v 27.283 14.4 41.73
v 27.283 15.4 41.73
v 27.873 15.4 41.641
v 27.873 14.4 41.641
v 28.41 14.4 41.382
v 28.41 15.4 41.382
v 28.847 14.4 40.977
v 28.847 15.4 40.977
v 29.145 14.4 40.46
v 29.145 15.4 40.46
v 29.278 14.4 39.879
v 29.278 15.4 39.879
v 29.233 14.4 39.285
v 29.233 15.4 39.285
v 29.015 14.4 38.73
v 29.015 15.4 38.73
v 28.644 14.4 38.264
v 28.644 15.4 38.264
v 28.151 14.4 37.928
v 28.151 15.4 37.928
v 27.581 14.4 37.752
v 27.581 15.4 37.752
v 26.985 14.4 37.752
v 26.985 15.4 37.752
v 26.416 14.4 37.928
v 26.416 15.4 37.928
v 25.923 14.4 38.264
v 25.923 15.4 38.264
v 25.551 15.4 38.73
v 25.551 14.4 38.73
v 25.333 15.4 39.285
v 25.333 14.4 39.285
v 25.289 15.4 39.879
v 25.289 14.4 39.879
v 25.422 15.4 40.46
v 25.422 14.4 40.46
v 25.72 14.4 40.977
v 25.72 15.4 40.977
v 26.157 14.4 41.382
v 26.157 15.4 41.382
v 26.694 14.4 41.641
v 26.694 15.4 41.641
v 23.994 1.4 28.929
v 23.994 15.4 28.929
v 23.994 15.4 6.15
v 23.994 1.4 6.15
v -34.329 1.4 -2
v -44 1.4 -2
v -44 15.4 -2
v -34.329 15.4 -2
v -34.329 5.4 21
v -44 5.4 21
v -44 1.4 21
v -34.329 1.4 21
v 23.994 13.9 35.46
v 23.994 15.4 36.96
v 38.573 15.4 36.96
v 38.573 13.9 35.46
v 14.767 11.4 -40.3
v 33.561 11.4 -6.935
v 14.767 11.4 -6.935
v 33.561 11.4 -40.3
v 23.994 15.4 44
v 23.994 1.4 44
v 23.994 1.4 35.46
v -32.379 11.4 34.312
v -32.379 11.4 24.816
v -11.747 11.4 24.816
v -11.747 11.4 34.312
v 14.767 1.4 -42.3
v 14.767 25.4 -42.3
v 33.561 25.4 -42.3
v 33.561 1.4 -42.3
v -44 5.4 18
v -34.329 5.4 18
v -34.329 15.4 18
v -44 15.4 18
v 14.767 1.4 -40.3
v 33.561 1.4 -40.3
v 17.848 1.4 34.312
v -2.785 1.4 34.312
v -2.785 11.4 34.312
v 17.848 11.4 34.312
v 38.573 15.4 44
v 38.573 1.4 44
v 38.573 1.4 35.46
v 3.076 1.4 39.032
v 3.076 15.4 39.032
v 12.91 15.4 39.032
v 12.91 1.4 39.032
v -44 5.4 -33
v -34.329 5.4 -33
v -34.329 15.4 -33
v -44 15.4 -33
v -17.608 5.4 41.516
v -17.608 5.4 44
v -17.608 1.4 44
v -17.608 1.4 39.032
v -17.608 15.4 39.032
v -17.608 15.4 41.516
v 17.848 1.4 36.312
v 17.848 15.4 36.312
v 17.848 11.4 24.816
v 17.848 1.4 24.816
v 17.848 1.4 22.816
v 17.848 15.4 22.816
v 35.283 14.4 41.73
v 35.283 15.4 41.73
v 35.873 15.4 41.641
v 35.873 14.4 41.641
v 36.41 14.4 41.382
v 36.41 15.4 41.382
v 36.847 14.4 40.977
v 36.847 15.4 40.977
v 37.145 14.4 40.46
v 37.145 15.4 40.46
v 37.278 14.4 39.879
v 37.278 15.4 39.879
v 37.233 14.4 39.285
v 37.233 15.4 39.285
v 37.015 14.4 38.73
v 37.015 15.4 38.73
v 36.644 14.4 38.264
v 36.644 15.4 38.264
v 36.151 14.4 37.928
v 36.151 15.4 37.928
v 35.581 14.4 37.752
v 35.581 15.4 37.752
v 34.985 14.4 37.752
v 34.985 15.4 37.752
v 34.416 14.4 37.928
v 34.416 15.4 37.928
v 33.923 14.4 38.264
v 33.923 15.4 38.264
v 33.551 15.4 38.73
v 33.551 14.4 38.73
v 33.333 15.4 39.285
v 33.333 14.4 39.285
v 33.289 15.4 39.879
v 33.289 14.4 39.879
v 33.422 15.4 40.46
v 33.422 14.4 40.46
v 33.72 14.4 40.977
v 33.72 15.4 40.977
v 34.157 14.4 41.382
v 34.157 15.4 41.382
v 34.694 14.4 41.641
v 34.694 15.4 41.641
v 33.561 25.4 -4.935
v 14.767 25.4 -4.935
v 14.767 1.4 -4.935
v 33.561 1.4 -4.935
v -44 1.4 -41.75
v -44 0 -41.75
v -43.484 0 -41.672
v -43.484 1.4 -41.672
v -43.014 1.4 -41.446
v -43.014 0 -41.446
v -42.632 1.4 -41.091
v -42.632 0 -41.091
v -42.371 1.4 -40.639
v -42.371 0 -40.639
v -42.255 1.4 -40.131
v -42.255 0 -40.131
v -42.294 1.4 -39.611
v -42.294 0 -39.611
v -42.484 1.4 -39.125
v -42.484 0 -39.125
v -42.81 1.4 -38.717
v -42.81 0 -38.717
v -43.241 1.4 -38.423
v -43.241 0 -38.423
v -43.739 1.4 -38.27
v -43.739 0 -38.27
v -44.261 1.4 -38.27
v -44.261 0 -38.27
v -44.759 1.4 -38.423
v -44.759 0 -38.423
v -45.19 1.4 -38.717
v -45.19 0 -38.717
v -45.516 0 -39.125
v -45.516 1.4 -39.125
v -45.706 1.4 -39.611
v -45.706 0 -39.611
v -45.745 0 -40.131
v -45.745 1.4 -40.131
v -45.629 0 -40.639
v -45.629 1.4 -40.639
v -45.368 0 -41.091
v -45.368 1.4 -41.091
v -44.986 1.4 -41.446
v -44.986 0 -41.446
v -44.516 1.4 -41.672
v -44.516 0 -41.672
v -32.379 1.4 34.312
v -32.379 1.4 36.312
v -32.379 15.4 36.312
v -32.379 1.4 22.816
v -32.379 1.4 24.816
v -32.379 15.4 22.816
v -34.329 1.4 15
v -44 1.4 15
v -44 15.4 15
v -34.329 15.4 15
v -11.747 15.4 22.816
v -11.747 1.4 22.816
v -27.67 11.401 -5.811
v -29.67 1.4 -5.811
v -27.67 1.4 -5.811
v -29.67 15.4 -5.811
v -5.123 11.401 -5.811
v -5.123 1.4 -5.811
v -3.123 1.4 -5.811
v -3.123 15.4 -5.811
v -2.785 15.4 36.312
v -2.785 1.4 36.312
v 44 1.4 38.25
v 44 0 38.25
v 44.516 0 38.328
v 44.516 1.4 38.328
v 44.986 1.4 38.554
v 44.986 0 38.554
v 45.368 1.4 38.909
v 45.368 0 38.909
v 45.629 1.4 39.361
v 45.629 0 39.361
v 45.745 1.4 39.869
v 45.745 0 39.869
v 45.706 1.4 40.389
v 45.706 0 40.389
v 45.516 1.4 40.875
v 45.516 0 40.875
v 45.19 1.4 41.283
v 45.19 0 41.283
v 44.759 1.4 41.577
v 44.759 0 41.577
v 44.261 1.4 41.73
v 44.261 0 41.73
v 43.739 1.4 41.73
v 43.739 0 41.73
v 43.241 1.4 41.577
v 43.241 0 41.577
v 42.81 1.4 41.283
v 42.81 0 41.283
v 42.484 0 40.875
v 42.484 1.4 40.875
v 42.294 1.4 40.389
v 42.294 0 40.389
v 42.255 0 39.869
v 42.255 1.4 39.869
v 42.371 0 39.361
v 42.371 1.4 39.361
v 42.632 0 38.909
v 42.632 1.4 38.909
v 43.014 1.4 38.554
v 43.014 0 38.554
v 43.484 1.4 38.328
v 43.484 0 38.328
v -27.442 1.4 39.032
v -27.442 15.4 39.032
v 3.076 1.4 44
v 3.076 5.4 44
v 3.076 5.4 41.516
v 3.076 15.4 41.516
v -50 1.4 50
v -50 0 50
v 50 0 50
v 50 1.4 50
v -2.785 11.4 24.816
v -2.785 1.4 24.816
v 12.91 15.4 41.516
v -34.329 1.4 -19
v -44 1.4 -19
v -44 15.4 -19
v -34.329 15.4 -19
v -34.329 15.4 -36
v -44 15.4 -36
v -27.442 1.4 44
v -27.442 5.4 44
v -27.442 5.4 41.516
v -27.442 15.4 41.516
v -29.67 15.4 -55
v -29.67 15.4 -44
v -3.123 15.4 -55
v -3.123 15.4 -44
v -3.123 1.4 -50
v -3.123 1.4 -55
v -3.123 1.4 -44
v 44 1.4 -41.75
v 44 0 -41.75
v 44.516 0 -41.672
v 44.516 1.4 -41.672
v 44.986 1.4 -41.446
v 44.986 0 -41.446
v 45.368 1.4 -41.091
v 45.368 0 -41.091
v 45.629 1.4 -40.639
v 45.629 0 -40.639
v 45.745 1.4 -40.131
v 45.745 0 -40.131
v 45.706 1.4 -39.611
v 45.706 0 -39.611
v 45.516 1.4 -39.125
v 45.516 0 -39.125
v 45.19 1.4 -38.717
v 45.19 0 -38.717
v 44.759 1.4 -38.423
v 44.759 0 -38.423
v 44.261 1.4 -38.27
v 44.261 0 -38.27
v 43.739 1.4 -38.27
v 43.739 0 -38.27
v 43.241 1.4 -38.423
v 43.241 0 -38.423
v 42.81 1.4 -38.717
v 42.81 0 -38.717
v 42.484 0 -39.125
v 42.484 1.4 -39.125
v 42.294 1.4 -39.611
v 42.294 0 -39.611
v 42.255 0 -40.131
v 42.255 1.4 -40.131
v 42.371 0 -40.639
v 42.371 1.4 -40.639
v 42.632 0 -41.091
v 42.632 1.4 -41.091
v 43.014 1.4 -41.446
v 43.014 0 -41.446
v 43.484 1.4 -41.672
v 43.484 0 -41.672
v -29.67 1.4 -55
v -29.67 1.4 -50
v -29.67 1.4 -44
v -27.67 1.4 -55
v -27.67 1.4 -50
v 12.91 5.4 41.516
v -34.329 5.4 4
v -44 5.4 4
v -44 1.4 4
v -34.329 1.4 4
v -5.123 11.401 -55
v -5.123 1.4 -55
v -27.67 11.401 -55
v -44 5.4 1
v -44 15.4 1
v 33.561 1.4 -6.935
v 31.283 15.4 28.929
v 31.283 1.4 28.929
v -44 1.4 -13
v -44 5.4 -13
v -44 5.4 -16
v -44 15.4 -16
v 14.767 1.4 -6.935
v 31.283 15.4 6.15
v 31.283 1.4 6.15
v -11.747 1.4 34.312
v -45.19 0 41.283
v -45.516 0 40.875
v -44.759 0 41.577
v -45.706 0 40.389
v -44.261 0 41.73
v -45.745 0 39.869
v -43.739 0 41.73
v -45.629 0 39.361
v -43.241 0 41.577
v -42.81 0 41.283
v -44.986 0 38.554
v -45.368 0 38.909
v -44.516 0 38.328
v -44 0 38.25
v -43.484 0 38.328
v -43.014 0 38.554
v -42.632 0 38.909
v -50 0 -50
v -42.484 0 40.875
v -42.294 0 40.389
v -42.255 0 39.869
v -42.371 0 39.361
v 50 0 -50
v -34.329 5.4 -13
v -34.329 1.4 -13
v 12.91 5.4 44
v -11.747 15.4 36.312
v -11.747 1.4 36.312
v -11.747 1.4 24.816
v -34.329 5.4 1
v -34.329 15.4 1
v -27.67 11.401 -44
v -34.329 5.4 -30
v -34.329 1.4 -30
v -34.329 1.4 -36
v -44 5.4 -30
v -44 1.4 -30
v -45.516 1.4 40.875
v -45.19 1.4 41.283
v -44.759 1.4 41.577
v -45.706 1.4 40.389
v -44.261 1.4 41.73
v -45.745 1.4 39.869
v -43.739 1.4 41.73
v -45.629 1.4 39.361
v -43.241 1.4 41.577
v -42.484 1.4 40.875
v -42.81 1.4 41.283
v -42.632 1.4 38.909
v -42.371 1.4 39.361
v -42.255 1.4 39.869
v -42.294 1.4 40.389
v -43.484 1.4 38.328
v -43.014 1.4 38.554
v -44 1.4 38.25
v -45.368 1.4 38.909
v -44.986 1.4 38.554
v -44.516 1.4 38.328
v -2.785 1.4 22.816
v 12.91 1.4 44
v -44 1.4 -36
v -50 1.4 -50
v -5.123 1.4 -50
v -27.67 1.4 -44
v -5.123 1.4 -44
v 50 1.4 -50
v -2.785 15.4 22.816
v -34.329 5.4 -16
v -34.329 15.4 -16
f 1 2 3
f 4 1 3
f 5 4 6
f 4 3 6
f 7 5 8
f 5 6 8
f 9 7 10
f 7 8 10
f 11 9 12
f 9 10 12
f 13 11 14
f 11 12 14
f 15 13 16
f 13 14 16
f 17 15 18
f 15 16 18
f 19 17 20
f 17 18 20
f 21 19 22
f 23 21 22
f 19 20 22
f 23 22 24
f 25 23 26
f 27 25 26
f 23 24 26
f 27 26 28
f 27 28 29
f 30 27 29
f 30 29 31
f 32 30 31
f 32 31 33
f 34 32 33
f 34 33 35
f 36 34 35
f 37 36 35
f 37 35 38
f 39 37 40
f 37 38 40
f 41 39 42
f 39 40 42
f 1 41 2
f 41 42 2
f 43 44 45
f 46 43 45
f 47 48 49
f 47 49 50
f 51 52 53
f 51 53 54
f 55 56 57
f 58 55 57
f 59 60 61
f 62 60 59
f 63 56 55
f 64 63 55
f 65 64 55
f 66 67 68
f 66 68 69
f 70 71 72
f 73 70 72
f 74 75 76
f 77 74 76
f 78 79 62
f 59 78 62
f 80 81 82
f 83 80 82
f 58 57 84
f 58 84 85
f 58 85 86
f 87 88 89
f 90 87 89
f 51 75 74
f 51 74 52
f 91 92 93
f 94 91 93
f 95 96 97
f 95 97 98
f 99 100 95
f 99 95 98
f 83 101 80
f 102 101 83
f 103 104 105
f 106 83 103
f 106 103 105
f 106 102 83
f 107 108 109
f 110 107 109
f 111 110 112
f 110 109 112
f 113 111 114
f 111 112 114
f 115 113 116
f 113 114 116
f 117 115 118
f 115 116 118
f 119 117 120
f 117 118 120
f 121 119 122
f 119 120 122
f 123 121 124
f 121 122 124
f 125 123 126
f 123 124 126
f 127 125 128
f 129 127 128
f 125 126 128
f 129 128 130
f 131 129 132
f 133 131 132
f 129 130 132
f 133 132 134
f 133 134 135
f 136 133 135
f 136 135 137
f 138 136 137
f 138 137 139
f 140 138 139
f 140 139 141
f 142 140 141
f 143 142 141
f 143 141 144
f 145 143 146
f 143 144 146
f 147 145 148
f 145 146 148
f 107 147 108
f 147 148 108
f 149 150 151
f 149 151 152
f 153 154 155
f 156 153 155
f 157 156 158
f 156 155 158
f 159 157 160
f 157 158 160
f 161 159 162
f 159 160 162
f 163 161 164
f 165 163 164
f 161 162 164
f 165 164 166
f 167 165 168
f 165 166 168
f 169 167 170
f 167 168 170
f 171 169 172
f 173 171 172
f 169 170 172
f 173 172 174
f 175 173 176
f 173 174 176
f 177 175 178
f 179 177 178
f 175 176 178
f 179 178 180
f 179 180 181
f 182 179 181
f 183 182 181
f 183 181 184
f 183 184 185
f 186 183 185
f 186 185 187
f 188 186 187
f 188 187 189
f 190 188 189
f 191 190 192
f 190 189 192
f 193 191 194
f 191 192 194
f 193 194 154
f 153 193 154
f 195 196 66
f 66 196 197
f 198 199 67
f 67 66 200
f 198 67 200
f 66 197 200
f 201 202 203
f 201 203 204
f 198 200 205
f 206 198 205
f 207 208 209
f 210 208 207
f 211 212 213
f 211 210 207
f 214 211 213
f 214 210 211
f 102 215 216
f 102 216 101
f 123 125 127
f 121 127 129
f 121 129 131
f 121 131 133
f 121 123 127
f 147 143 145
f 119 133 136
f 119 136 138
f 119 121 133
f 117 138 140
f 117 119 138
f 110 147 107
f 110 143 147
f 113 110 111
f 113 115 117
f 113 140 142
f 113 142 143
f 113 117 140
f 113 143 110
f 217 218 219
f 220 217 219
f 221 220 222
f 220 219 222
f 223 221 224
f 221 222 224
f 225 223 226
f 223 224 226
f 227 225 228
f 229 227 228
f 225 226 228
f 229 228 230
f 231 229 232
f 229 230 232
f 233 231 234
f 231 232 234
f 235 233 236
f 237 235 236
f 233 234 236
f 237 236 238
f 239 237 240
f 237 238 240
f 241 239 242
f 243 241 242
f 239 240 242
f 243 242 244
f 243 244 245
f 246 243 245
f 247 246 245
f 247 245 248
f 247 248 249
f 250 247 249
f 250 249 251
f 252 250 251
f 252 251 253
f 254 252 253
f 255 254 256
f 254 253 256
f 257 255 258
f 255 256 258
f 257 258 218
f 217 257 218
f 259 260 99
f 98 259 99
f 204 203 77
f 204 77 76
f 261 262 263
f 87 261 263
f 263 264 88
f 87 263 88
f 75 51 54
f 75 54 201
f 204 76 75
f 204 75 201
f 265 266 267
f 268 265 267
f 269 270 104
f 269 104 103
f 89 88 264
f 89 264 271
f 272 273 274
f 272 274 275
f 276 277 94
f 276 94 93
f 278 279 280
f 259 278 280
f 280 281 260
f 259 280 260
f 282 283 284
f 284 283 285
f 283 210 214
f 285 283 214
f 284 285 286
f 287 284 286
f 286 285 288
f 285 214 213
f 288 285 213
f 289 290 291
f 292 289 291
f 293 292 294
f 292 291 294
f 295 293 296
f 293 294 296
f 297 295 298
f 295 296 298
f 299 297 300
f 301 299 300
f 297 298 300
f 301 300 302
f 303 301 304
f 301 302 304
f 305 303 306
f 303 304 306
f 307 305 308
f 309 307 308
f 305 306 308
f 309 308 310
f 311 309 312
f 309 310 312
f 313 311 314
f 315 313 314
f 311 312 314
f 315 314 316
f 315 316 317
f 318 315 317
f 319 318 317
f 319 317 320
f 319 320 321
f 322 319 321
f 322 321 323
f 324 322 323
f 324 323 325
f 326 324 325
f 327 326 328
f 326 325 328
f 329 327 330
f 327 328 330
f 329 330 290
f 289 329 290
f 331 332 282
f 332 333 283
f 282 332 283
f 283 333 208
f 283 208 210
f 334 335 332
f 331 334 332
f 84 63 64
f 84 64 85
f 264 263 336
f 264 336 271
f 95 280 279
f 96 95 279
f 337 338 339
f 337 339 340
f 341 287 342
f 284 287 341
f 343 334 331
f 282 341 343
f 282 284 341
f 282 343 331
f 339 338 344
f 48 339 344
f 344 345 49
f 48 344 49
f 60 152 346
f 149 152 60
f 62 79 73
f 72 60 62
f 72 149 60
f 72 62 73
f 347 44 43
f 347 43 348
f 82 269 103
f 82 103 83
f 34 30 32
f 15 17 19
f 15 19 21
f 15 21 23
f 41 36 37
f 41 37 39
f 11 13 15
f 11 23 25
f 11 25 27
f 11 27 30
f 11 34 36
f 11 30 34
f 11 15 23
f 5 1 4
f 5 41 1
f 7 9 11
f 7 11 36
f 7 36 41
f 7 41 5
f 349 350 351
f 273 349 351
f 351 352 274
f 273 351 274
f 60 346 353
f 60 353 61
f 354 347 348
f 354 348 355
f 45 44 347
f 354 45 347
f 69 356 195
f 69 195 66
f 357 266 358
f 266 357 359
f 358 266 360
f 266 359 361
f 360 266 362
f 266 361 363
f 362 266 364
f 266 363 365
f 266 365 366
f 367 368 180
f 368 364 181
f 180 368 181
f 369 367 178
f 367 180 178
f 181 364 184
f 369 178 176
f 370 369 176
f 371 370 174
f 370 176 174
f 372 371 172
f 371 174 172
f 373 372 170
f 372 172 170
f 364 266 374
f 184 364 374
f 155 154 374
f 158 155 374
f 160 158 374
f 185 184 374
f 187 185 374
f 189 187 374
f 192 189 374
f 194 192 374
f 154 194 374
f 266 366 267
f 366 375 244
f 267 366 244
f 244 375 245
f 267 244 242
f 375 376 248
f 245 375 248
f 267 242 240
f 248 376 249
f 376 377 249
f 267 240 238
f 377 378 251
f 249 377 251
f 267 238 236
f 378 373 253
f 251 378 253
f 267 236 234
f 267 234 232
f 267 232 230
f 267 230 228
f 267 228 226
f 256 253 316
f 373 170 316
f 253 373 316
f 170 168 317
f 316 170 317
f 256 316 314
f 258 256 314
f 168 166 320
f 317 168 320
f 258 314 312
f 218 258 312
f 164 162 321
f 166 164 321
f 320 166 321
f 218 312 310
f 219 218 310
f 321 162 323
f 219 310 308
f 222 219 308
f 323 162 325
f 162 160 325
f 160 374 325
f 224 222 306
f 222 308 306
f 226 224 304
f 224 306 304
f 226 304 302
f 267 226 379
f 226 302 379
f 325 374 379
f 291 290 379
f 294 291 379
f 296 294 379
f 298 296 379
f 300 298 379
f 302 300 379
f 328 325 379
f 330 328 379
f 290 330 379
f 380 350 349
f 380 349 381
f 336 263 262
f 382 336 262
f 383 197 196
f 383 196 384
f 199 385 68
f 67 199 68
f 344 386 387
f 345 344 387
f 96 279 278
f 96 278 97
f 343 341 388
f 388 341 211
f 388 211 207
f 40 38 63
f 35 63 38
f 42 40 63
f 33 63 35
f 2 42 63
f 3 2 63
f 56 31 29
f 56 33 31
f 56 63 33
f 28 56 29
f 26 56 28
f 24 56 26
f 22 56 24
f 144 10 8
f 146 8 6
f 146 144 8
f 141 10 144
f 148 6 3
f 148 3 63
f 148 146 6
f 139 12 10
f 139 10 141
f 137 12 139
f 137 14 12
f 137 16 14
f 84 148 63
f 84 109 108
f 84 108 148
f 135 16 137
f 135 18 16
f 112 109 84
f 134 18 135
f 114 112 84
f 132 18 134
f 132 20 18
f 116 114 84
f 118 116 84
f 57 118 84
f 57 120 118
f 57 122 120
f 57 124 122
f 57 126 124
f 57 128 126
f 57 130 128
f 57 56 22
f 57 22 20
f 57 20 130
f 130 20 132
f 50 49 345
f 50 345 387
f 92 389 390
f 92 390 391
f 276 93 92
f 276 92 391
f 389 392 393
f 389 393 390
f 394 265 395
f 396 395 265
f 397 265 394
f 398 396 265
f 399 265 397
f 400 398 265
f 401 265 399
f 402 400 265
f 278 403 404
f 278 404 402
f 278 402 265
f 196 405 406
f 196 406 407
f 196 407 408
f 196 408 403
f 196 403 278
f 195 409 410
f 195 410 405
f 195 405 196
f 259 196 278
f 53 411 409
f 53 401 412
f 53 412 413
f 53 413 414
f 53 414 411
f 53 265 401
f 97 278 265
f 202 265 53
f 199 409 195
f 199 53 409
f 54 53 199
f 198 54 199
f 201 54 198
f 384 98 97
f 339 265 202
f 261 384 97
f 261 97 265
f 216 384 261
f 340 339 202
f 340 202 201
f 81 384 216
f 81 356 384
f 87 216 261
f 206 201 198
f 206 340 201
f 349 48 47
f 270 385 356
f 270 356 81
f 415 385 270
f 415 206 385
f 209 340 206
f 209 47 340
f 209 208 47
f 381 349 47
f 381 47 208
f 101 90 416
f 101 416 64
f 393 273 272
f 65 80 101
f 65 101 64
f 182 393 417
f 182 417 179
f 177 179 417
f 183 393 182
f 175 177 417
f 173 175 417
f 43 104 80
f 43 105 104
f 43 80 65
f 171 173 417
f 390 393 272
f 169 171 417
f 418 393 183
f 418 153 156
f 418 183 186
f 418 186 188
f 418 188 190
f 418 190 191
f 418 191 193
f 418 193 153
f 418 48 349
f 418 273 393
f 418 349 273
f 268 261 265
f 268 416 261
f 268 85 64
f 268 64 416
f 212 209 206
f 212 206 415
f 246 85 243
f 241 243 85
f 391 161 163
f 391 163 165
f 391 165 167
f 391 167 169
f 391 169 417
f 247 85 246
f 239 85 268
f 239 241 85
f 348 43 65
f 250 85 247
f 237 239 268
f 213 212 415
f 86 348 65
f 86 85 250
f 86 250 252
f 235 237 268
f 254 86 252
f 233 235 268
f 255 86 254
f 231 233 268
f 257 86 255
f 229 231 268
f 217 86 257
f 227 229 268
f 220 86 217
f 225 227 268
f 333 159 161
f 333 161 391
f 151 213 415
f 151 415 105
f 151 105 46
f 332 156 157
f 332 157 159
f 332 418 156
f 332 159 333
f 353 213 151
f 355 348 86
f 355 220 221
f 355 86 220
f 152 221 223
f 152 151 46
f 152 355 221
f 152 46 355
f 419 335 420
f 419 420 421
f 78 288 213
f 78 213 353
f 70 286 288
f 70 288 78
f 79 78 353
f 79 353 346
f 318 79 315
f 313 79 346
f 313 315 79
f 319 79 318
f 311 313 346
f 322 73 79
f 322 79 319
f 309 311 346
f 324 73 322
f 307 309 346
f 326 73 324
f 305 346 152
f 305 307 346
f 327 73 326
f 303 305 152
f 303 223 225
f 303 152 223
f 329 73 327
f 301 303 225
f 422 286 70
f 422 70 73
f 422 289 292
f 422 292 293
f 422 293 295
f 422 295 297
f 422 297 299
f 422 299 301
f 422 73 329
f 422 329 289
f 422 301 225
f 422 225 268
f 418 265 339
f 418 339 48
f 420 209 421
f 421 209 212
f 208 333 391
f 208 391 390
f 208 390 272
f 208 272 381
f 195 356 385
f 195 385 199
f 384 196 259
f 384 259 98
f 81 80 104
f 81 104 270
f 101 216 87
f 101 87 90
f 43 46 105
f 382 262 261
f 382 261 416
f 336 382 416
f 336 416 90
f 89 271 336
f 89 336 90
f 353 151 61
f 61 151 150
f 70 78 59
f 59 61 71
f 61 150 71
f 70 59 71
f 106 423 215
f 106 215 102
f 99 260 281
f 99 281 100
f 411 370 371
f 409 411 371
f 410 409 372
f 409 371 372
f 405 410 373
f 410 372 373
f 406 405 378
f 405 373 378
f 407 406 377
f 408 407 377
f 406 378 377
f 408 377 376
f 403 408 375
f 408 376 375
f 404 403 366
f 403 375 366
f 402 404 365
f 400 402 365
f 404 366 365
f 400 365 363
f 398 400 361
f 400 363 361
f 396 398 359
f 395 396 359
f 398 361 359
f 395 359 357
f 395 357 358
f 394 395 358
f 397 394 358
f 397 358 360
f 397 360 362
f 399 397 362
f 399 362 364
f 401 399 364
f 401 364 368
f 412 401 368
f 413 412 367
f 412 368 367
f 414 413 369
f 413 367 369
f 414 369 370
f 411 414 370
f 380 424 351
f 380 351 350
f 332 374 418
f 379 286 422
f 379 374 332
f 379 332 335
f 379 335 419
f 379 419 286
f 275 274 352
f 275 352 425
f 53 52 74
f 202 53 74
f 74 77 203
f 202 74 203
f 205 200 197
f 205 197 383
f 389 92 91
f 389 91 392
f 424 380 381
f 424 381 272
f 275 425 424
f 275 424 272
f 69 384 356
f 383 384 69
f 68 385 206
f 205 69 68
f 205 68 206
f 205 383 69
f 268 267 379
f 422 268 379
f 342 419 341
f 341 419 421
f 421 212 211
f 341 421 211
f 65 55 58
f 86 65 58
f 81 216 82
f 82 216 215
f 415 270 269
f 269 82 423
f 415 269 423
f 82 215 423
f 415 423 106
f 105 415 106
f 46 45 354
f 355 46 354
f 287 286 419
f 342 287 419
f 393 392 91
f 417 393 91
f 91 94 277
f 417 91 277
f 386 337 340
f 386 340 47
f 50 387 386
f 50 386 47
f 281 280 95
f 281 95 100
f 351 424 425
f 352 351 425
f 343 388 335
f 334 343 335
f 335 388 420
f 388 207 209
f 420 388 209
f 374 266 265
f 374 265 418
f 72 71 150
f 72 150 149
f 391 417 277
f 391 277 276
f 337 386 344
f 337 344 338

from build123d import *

# Parameters (mm, degrees)
ESBO_O1_W                = 100
ESBO_O1_H                = 100
RESSALTO_EXTRUS_O1_DEPTH = 1.4
ESBO_O2_W                = 88
ESBO_O2_H                = 88
RESSALTO_EXTRUS_O2_DEPTH = 24
ESBO_O4_W                = 100
ESBO_O4_H                = 100
ESBO_O4_W_2              = 14.578639588
ESBO_O4_H_2              = 8.540496419
ESBO_O4_W_3              = 7.289319794
ESBO_O4_H_3              = 22.779124356
ESBO_O4_W_4              = 18.794478339
ESBO_O4_H_4              = 37.364152615
ESBO_O4_W_5              = 26.546651383
ESBO_O4_H_5              = 38.188932231
ESBO_O4_W_6              = 20.632673902
ESBO_O4_H_6              = 13.495583341
ESBO_O4_W_7              = 9.670550534
ESBO_O4_H_7              = 6
ESBO_O4_W_8              = 9.833990962
ESBO_O4_H_8              = 4.968111267
CORTE_EXTRUS_O1_DEPTH    = 24
ESBO_O5_W                = 26.546651383
ESBO_O5_H                = 38.188932231
ESBO_O5_W_2              = 7.289319794
ESBO_O5_H_2              = 22.779124356
ESBO_O5_W_3              = 20.632673902
ESBO_O5_H_3              = 13.495583341
ESBO_O5_W_4              = 14.578639588
ESBO_O5_H_4              = 8.540496419
ESBO_O5_W_5              = 9.670550534
ESBO_O5_H_5              = 6
ESBO_O5_W_6              = 9.833990962
ESBO_O5_H_6              = 4.968111267
CORTE_EXTRUS_O2_DEPTH    = 10
ESBO_O6_R                = 2
CORTE_EXTRUS_O3_DEPTH    = 1
CHANFRO1_SIZE            = 1.5
CORTE_EXTRUS_O4_REACH    = 102.636
ESBO_O7_W                = 33.364152615
ESBO_O7_H                = 10
CORTE_EXTRUS_O5_REACH    = 111.458
ESBO_O8_W                = 22.546651383
ESBO_O8_H                = 10.000703343
CORTE_EXTRUS_O6_REACH    = 101.657
ESBO_O9_W                = 9.495583341
ESBO_O9_H                = 10
ESBO_O10_W               = 3
ESBO_O10_H               = 10
CORTE_EXTRUS_O7_DEPTH    = 9.670550534
CORTE_EXTRUS_O8_REACH    = 97.616
ESBO_O11_W               = 2.484055633
ESBO_O11_H               = 10
ESBO_O12_R               = 1.75
CORTE_EXTRUS_O9_DEPTH    = 1.4
RESSALTO_EXTRUS_O3_DEPTH = 11


with BuildPart() as part:
    # Esboço1 → Ressalto-extrusão1 (new body)
    with BuildSketch(Plane(origin=(0, 0, 0), x_dir=(1, 0, 0), z_dir=(0, 1, 0))):
        Rectangle(ESBO_O1_W, ESBO_O1_H)
    extrude(amount=RESSALTO_EXTRUS_O1_DEPTH)

    # Esboço2 → Ressalto-extrusão2 (add)
    with BuildSketch(Plane(origin=(0, 1.4, 0), x_dir=(1, 0, 0), z_dir=(0, 1, 0))):
        Rectangle(ESBO_O2_W, ESBO_O2_H)
    extrude(amount=RESSALTO_EXTRUS_O2_DEPTH)

    # Esboço4 → Corte-extrusão1 (cut)
    with BuildSketch(Plane(origin=(0, 25.4, 0), x_dir=(1, 0, 0), z_dir=(0, 1, 0))):
        Rectangle(ESBO_O4_W, ESBO_O4_H)
        with Locations((31.283330783, -39.729751791)):
            Rectangle(ESBO_O4_W_2, ESBO_O4_H_2, mode=Mode.SUBTRACT)
        with Locations((27.638670886, -17.539925754)):
            Rectangle(ESBO_O4_W_3, ESBO_O4_H_3, mode=Mode.SUBTRACT)
        with Locations((24.164004049, 23.617553252)):
            Rectangle(ESBO_O4_W_4, ESBO_O4_H_4, mode=Mode.SUBTRACT)
        with Locations((-16.396734338, 24.905533884)):
            Rectangle(ESBO_O4_W_5, ESBO_O4_H_5, mode=Mode.SUBTRACT)
        with Locations((-22.063064097, -29.56405701)):
            Rectangle(ESBO_O4_W_6, ESBO_O4_H_6, mode=Mode.SUBTRACT)
        with Locations((7.531276247, -29.56405701)):
            Rectangle(ESBO_O4_W_6, ESBO_O4_H_6, mode=Mode.SUBTRACT)
        with Locations((-39.164724733, 33)):
            Rectangle(ESBO_O4_W_7, ESBO_O4_H_7, mode=Mode.SUBTRACT)
        with Locations((-39.164724733, 16)):
            Rectangle(ESBO_O4_W_7, ESBO_O4_H_7, mode=Mode.SUBTRACT)
        with Locations((-39.164724733, -1)):
            Rectangle(ESBO_O4_W_7, ESBO_O4_H_7, mode=Mode.SUBTRACT)
        with Locations((-39.164724733, -18)):
            Rectangle(ESBO_O4_W_7, ESBO_O4_H_7, mode=Mode.SUBTRACT)
        with Locations((-22.524725577, -41.515944367)):
            Rectangle(ESBO_O4_W_8, ESBO_O4_H_8, mode=Mode.SUBTRACT)
        with Locations((7.992937727, -41.515944367)):
            Rectangle(ESBO_O4_W_8, ESBO_O4_H_8, mode=Mode.SUBTRACT)
    extrude(amount=-CORTE_EXTRUS_O1_DEPTH, mode=Mode.SUBTRACT)

    # Esboço5 → Corte-extrusão2 (cut)
    with BuildSketch(Plane(origin=(0, 25.4, 0), x_dir=(1, 0, 0), z_dir=(0, 1, 0))):
        with Locations((-16.396734338, 24.905533884)):
            Rectangle(ESBO_O5_W, ESBO_O5_H)
        with Locations((27.638670886, -17.539925754)):
            Rectangle(ESBO_O5_W_2, ESBO_O5_H_2)
        with Locations((7.531276247, -29.56405701)):
            Rectangle(ESBO_O5_W_3, ESBO_O5_H_3)
        with Locations((-22.063064097, -29.56405701)):
            Rectangle(ESBO_O5_W_3, ESBO_O5_H_3)
        with Locations((31.283330783, -39.729751791)):
            Rectangle(ESBO_O5_W_4, ESBO_O5_H_4)
        with Locations((-39.164724733, -18)):
            Rectangle(ESBO_O5_W_5, ESBO_O5_H_5)
        with Locations((-39.164724733, -1)):
            Rectangle(ESBO_O5_W_5, ESBO_O5_H_5)
        with Locations((-39.164724733, 16)):
            Rectangle(ESBO_O5_W_5, ESBO_O5_H_5)
        with Locations((-39.164724733, 33)):
            Rectangle(ESBO_O5_W_5, ESBO_O5_H_5)
        with Locations((7.992937727, -41.515944367)):
            Rectangle(ESBO_O5_W_6, ESBO_O5_H_6)
        with Locations((-22.524725577, -41.515944367)):
            Rectangle(ESBO_O5_W_6, ESBO_O5_H_6)
    extrude(amount=-CORTE_EXTRUS_O2_DEPTH, mode=Mode.SUBTRACT)

    # Esboço6 → Corte-extrusão3 (cut)
    with BuildSketch(Plane(origin=(0, 15.4, 0), x_dir=(1, 0, 0), z_dir=(0, 1, 0))):
        with Locations(Location((27.283330783, -39.729751791, 0), (0, 0, 270))):
            Circle(ESBO_O6_R)
        with Locations(Location((35.283330783, -39.729751791, 0), (0, 0, 270))):
            Circle(ESBO_O6_R)
    extrude(amount=-CORTE_EXTRUS_O3_DEPTH, mode=Mode.SUBTRACT)

    # Chanfro1
    chanfro1_edges = [part.edges().sort_by_distance(p)[0] for p in [
        (31.283330783, 15.4, 35.459503581),
    ]]
    chamfer(chanfro1_edges, length=CHANFRO1_SIZE)

    # Esboço7 → Corte-extrusão4 (cut, up to next)
    with BuildSketch(Plane(origin=(33.561243218, 0, 0), x_dir=(0, 0, -1), z_dir=(1, 0, 0)), mode=Mode.PRIVATE) as corte_extrus_o4_sk1:
        with Locations((23.617553252, 6.4)):
            Rectangle(ESBO_O7_W, ESBO_O7_H)
    corte_extrus_o4_tool1 = extrude(corte_extrus_o4_sk1.sketch, amount=-CORTE_EXTRUS_O4_REACH, mode=Mode.PRIVATE) & part.part
    add(corte_extrus_o4_tool1.solids().sort_by_distance((33.561243, 6.4, -23.617553))[0], mode=Mode.SUBTRACT)

    # Esboço8 → Corte-extrusão5 (cut, up to next)
    with BuildSketch(Plane(origin=(0, 0, -44), x_dir=(-1, 0, 0), z_dir=(0, 0, -1)), mode=Mode.PRIVATE) as corte_extrus_o5_sk1:
        with Locations((16.396734338, 6.400351672)):
            Rectangle(ESBO_O8_W, ESBO_O8_H)
    corte_extrus_o5_tool1 = extrude(corte_extrus_o5_sk1.sketch, amount=-CORTE_EXTRUS_O5_REACH, mode=Mode.PRIVATE) & part.part
    add(corte_extrus_o5_tool1.solids().sort_by_distance((-16.396734, 6.400352, -44))[0], mode=Mode.SUBTRACT)

    # Corte-extrusão6: up to this face of the body (flat: up to its plane)
    corte_extrus_o6_end = Plane(part.part.faces().sort_by_distance((17.847613198, 8.4, 29.56405701))[0])
    # Esboço9 → Corte-extrusão6 (cut, up to the picked face)
    with BuildSketch(Plane.ZY.offset(32.379401048), mode=Mode.PRIVATE) as corte_extrus_o6_sk1:
        with Locations((29.56405701, 6.4)):
            Rectangle(ESBO_O9_W, ESBO_O9_H)
    corte_extrus_o6_tool1 = split(extrude(corte_extrus_o6_sk1.sketch, amount=-CORTE_EXTRUS_O6_REACH, mode=Mode.PRIVATE), bisect_by=corte_extrus_o6_end, keep=Keep.BOTH, mode=Mode.PRIVATE)
    add(corte_extrus_o6_tool1.solids().sort_by(Axis((-32.379401, 6.4, 29.564057), (1, 0, 0)))[0], mode=Mode.SUBTRACT)

    # Esboço10 → Corte-extrusão7 (cut)
    with BuildSketch(Plane.ZY.offset(34.329449466)):
        with Locations((-31.5, 10.4)):
            Rectangle(ESBO_O10_W, ESBO_O10_H)
        with Locations((-14.5, 10.4)):
            Rectangle(ESBO_O10_W, ESBO_O10_H)
        with Locations((2.5, 10.4)):
            Rectangle(ESBO_O10_W, ESBO_O10_H)
        with Locations((19.5, 10.4)):
            Rectangle(ESBO_O10_W, ESBO_O10_H)
    extrude(amount=CORTE_EXTRUS_O7_DEPTH, mode=Mode.SUBTRACT)

    # Corte-extrusão8: up to this face of the body (flat: up to its plane)
    corte_extrus_o8_end = Plane(part.part.faces().sort_by_distance((12.909933208, 8.4, 41.515944367))[0])
    # Esboço11 → Corte-extrusão8 (cut, up to the picked face)
    with BuildSketch(Plane.ZY.offset(27.441721058), mode=Mode.PRIVATE) as corte_extrus_o8_sk1:
        with Locations((42.757972184, 10.4)):
            Rectangle(ESBO_O11_W, ESBO_O11_H)
    corte_extrus_o8_tool1 = split(extrude(corte_extrus_o8_sk1.sketch, amount=-CORTE_EXTRUS_O8_REACH, mode=Mode.PRIVATE), bisect_by=corte_extrus_o8_end, keep=Keep.BOTH, mode=Mode.PRIVATE)
    add(corte_extrus_o8_tool1.solids().sort_by(Axis((-27.441721, 10.4, 42.757972), (1, 0, 0)))[0], mode=Mode.SUBTRACT)

    # Esboço12 → Corte-extrusão9 (cut)
    with BuildSketch(Plane.XZ):
        with Locations(Location((-44, 40, 0), (0, 0, 270))):
            Circle(ESBO_O12_R)
        with Locations(Location((44, 40, 0), (0, 0, 270))):
            Circle(ESBO_O12_R)
        with Locations(Location((44, -40, 0), (0, 0, 270))):
            Circle(ESBO_O12_R)
        with Locations(Location((-44, -40, 0), (0, 0, 270))):
            Circle(ESBO_O12_R)
    extrude(amount=-CORTE_EXTRUS_O9_DEPTH, mode=Mode.SUBTRACT)

    # Esboço13 → Ressalto-extrusão3 (add)
    with BuildSketch(Plane(origin=(0, 0, -44), x_dir=(-1, 0, 0), z_dir=(0, 0, -1))):
        Polygon((5.123408647, 11.400703343), (27.67006003, 11.400703343), (27.67006003, 1.4), (29.67006003, 1.4), (29.67006003, 15.4), (3.123408647, 15.4), (3.123408647, 1.4), (5.123408647, 1.4), align=None)
    extrude(amount=RESSALTO_EXTRUS_O3_DEPTH)


solid = part.part
